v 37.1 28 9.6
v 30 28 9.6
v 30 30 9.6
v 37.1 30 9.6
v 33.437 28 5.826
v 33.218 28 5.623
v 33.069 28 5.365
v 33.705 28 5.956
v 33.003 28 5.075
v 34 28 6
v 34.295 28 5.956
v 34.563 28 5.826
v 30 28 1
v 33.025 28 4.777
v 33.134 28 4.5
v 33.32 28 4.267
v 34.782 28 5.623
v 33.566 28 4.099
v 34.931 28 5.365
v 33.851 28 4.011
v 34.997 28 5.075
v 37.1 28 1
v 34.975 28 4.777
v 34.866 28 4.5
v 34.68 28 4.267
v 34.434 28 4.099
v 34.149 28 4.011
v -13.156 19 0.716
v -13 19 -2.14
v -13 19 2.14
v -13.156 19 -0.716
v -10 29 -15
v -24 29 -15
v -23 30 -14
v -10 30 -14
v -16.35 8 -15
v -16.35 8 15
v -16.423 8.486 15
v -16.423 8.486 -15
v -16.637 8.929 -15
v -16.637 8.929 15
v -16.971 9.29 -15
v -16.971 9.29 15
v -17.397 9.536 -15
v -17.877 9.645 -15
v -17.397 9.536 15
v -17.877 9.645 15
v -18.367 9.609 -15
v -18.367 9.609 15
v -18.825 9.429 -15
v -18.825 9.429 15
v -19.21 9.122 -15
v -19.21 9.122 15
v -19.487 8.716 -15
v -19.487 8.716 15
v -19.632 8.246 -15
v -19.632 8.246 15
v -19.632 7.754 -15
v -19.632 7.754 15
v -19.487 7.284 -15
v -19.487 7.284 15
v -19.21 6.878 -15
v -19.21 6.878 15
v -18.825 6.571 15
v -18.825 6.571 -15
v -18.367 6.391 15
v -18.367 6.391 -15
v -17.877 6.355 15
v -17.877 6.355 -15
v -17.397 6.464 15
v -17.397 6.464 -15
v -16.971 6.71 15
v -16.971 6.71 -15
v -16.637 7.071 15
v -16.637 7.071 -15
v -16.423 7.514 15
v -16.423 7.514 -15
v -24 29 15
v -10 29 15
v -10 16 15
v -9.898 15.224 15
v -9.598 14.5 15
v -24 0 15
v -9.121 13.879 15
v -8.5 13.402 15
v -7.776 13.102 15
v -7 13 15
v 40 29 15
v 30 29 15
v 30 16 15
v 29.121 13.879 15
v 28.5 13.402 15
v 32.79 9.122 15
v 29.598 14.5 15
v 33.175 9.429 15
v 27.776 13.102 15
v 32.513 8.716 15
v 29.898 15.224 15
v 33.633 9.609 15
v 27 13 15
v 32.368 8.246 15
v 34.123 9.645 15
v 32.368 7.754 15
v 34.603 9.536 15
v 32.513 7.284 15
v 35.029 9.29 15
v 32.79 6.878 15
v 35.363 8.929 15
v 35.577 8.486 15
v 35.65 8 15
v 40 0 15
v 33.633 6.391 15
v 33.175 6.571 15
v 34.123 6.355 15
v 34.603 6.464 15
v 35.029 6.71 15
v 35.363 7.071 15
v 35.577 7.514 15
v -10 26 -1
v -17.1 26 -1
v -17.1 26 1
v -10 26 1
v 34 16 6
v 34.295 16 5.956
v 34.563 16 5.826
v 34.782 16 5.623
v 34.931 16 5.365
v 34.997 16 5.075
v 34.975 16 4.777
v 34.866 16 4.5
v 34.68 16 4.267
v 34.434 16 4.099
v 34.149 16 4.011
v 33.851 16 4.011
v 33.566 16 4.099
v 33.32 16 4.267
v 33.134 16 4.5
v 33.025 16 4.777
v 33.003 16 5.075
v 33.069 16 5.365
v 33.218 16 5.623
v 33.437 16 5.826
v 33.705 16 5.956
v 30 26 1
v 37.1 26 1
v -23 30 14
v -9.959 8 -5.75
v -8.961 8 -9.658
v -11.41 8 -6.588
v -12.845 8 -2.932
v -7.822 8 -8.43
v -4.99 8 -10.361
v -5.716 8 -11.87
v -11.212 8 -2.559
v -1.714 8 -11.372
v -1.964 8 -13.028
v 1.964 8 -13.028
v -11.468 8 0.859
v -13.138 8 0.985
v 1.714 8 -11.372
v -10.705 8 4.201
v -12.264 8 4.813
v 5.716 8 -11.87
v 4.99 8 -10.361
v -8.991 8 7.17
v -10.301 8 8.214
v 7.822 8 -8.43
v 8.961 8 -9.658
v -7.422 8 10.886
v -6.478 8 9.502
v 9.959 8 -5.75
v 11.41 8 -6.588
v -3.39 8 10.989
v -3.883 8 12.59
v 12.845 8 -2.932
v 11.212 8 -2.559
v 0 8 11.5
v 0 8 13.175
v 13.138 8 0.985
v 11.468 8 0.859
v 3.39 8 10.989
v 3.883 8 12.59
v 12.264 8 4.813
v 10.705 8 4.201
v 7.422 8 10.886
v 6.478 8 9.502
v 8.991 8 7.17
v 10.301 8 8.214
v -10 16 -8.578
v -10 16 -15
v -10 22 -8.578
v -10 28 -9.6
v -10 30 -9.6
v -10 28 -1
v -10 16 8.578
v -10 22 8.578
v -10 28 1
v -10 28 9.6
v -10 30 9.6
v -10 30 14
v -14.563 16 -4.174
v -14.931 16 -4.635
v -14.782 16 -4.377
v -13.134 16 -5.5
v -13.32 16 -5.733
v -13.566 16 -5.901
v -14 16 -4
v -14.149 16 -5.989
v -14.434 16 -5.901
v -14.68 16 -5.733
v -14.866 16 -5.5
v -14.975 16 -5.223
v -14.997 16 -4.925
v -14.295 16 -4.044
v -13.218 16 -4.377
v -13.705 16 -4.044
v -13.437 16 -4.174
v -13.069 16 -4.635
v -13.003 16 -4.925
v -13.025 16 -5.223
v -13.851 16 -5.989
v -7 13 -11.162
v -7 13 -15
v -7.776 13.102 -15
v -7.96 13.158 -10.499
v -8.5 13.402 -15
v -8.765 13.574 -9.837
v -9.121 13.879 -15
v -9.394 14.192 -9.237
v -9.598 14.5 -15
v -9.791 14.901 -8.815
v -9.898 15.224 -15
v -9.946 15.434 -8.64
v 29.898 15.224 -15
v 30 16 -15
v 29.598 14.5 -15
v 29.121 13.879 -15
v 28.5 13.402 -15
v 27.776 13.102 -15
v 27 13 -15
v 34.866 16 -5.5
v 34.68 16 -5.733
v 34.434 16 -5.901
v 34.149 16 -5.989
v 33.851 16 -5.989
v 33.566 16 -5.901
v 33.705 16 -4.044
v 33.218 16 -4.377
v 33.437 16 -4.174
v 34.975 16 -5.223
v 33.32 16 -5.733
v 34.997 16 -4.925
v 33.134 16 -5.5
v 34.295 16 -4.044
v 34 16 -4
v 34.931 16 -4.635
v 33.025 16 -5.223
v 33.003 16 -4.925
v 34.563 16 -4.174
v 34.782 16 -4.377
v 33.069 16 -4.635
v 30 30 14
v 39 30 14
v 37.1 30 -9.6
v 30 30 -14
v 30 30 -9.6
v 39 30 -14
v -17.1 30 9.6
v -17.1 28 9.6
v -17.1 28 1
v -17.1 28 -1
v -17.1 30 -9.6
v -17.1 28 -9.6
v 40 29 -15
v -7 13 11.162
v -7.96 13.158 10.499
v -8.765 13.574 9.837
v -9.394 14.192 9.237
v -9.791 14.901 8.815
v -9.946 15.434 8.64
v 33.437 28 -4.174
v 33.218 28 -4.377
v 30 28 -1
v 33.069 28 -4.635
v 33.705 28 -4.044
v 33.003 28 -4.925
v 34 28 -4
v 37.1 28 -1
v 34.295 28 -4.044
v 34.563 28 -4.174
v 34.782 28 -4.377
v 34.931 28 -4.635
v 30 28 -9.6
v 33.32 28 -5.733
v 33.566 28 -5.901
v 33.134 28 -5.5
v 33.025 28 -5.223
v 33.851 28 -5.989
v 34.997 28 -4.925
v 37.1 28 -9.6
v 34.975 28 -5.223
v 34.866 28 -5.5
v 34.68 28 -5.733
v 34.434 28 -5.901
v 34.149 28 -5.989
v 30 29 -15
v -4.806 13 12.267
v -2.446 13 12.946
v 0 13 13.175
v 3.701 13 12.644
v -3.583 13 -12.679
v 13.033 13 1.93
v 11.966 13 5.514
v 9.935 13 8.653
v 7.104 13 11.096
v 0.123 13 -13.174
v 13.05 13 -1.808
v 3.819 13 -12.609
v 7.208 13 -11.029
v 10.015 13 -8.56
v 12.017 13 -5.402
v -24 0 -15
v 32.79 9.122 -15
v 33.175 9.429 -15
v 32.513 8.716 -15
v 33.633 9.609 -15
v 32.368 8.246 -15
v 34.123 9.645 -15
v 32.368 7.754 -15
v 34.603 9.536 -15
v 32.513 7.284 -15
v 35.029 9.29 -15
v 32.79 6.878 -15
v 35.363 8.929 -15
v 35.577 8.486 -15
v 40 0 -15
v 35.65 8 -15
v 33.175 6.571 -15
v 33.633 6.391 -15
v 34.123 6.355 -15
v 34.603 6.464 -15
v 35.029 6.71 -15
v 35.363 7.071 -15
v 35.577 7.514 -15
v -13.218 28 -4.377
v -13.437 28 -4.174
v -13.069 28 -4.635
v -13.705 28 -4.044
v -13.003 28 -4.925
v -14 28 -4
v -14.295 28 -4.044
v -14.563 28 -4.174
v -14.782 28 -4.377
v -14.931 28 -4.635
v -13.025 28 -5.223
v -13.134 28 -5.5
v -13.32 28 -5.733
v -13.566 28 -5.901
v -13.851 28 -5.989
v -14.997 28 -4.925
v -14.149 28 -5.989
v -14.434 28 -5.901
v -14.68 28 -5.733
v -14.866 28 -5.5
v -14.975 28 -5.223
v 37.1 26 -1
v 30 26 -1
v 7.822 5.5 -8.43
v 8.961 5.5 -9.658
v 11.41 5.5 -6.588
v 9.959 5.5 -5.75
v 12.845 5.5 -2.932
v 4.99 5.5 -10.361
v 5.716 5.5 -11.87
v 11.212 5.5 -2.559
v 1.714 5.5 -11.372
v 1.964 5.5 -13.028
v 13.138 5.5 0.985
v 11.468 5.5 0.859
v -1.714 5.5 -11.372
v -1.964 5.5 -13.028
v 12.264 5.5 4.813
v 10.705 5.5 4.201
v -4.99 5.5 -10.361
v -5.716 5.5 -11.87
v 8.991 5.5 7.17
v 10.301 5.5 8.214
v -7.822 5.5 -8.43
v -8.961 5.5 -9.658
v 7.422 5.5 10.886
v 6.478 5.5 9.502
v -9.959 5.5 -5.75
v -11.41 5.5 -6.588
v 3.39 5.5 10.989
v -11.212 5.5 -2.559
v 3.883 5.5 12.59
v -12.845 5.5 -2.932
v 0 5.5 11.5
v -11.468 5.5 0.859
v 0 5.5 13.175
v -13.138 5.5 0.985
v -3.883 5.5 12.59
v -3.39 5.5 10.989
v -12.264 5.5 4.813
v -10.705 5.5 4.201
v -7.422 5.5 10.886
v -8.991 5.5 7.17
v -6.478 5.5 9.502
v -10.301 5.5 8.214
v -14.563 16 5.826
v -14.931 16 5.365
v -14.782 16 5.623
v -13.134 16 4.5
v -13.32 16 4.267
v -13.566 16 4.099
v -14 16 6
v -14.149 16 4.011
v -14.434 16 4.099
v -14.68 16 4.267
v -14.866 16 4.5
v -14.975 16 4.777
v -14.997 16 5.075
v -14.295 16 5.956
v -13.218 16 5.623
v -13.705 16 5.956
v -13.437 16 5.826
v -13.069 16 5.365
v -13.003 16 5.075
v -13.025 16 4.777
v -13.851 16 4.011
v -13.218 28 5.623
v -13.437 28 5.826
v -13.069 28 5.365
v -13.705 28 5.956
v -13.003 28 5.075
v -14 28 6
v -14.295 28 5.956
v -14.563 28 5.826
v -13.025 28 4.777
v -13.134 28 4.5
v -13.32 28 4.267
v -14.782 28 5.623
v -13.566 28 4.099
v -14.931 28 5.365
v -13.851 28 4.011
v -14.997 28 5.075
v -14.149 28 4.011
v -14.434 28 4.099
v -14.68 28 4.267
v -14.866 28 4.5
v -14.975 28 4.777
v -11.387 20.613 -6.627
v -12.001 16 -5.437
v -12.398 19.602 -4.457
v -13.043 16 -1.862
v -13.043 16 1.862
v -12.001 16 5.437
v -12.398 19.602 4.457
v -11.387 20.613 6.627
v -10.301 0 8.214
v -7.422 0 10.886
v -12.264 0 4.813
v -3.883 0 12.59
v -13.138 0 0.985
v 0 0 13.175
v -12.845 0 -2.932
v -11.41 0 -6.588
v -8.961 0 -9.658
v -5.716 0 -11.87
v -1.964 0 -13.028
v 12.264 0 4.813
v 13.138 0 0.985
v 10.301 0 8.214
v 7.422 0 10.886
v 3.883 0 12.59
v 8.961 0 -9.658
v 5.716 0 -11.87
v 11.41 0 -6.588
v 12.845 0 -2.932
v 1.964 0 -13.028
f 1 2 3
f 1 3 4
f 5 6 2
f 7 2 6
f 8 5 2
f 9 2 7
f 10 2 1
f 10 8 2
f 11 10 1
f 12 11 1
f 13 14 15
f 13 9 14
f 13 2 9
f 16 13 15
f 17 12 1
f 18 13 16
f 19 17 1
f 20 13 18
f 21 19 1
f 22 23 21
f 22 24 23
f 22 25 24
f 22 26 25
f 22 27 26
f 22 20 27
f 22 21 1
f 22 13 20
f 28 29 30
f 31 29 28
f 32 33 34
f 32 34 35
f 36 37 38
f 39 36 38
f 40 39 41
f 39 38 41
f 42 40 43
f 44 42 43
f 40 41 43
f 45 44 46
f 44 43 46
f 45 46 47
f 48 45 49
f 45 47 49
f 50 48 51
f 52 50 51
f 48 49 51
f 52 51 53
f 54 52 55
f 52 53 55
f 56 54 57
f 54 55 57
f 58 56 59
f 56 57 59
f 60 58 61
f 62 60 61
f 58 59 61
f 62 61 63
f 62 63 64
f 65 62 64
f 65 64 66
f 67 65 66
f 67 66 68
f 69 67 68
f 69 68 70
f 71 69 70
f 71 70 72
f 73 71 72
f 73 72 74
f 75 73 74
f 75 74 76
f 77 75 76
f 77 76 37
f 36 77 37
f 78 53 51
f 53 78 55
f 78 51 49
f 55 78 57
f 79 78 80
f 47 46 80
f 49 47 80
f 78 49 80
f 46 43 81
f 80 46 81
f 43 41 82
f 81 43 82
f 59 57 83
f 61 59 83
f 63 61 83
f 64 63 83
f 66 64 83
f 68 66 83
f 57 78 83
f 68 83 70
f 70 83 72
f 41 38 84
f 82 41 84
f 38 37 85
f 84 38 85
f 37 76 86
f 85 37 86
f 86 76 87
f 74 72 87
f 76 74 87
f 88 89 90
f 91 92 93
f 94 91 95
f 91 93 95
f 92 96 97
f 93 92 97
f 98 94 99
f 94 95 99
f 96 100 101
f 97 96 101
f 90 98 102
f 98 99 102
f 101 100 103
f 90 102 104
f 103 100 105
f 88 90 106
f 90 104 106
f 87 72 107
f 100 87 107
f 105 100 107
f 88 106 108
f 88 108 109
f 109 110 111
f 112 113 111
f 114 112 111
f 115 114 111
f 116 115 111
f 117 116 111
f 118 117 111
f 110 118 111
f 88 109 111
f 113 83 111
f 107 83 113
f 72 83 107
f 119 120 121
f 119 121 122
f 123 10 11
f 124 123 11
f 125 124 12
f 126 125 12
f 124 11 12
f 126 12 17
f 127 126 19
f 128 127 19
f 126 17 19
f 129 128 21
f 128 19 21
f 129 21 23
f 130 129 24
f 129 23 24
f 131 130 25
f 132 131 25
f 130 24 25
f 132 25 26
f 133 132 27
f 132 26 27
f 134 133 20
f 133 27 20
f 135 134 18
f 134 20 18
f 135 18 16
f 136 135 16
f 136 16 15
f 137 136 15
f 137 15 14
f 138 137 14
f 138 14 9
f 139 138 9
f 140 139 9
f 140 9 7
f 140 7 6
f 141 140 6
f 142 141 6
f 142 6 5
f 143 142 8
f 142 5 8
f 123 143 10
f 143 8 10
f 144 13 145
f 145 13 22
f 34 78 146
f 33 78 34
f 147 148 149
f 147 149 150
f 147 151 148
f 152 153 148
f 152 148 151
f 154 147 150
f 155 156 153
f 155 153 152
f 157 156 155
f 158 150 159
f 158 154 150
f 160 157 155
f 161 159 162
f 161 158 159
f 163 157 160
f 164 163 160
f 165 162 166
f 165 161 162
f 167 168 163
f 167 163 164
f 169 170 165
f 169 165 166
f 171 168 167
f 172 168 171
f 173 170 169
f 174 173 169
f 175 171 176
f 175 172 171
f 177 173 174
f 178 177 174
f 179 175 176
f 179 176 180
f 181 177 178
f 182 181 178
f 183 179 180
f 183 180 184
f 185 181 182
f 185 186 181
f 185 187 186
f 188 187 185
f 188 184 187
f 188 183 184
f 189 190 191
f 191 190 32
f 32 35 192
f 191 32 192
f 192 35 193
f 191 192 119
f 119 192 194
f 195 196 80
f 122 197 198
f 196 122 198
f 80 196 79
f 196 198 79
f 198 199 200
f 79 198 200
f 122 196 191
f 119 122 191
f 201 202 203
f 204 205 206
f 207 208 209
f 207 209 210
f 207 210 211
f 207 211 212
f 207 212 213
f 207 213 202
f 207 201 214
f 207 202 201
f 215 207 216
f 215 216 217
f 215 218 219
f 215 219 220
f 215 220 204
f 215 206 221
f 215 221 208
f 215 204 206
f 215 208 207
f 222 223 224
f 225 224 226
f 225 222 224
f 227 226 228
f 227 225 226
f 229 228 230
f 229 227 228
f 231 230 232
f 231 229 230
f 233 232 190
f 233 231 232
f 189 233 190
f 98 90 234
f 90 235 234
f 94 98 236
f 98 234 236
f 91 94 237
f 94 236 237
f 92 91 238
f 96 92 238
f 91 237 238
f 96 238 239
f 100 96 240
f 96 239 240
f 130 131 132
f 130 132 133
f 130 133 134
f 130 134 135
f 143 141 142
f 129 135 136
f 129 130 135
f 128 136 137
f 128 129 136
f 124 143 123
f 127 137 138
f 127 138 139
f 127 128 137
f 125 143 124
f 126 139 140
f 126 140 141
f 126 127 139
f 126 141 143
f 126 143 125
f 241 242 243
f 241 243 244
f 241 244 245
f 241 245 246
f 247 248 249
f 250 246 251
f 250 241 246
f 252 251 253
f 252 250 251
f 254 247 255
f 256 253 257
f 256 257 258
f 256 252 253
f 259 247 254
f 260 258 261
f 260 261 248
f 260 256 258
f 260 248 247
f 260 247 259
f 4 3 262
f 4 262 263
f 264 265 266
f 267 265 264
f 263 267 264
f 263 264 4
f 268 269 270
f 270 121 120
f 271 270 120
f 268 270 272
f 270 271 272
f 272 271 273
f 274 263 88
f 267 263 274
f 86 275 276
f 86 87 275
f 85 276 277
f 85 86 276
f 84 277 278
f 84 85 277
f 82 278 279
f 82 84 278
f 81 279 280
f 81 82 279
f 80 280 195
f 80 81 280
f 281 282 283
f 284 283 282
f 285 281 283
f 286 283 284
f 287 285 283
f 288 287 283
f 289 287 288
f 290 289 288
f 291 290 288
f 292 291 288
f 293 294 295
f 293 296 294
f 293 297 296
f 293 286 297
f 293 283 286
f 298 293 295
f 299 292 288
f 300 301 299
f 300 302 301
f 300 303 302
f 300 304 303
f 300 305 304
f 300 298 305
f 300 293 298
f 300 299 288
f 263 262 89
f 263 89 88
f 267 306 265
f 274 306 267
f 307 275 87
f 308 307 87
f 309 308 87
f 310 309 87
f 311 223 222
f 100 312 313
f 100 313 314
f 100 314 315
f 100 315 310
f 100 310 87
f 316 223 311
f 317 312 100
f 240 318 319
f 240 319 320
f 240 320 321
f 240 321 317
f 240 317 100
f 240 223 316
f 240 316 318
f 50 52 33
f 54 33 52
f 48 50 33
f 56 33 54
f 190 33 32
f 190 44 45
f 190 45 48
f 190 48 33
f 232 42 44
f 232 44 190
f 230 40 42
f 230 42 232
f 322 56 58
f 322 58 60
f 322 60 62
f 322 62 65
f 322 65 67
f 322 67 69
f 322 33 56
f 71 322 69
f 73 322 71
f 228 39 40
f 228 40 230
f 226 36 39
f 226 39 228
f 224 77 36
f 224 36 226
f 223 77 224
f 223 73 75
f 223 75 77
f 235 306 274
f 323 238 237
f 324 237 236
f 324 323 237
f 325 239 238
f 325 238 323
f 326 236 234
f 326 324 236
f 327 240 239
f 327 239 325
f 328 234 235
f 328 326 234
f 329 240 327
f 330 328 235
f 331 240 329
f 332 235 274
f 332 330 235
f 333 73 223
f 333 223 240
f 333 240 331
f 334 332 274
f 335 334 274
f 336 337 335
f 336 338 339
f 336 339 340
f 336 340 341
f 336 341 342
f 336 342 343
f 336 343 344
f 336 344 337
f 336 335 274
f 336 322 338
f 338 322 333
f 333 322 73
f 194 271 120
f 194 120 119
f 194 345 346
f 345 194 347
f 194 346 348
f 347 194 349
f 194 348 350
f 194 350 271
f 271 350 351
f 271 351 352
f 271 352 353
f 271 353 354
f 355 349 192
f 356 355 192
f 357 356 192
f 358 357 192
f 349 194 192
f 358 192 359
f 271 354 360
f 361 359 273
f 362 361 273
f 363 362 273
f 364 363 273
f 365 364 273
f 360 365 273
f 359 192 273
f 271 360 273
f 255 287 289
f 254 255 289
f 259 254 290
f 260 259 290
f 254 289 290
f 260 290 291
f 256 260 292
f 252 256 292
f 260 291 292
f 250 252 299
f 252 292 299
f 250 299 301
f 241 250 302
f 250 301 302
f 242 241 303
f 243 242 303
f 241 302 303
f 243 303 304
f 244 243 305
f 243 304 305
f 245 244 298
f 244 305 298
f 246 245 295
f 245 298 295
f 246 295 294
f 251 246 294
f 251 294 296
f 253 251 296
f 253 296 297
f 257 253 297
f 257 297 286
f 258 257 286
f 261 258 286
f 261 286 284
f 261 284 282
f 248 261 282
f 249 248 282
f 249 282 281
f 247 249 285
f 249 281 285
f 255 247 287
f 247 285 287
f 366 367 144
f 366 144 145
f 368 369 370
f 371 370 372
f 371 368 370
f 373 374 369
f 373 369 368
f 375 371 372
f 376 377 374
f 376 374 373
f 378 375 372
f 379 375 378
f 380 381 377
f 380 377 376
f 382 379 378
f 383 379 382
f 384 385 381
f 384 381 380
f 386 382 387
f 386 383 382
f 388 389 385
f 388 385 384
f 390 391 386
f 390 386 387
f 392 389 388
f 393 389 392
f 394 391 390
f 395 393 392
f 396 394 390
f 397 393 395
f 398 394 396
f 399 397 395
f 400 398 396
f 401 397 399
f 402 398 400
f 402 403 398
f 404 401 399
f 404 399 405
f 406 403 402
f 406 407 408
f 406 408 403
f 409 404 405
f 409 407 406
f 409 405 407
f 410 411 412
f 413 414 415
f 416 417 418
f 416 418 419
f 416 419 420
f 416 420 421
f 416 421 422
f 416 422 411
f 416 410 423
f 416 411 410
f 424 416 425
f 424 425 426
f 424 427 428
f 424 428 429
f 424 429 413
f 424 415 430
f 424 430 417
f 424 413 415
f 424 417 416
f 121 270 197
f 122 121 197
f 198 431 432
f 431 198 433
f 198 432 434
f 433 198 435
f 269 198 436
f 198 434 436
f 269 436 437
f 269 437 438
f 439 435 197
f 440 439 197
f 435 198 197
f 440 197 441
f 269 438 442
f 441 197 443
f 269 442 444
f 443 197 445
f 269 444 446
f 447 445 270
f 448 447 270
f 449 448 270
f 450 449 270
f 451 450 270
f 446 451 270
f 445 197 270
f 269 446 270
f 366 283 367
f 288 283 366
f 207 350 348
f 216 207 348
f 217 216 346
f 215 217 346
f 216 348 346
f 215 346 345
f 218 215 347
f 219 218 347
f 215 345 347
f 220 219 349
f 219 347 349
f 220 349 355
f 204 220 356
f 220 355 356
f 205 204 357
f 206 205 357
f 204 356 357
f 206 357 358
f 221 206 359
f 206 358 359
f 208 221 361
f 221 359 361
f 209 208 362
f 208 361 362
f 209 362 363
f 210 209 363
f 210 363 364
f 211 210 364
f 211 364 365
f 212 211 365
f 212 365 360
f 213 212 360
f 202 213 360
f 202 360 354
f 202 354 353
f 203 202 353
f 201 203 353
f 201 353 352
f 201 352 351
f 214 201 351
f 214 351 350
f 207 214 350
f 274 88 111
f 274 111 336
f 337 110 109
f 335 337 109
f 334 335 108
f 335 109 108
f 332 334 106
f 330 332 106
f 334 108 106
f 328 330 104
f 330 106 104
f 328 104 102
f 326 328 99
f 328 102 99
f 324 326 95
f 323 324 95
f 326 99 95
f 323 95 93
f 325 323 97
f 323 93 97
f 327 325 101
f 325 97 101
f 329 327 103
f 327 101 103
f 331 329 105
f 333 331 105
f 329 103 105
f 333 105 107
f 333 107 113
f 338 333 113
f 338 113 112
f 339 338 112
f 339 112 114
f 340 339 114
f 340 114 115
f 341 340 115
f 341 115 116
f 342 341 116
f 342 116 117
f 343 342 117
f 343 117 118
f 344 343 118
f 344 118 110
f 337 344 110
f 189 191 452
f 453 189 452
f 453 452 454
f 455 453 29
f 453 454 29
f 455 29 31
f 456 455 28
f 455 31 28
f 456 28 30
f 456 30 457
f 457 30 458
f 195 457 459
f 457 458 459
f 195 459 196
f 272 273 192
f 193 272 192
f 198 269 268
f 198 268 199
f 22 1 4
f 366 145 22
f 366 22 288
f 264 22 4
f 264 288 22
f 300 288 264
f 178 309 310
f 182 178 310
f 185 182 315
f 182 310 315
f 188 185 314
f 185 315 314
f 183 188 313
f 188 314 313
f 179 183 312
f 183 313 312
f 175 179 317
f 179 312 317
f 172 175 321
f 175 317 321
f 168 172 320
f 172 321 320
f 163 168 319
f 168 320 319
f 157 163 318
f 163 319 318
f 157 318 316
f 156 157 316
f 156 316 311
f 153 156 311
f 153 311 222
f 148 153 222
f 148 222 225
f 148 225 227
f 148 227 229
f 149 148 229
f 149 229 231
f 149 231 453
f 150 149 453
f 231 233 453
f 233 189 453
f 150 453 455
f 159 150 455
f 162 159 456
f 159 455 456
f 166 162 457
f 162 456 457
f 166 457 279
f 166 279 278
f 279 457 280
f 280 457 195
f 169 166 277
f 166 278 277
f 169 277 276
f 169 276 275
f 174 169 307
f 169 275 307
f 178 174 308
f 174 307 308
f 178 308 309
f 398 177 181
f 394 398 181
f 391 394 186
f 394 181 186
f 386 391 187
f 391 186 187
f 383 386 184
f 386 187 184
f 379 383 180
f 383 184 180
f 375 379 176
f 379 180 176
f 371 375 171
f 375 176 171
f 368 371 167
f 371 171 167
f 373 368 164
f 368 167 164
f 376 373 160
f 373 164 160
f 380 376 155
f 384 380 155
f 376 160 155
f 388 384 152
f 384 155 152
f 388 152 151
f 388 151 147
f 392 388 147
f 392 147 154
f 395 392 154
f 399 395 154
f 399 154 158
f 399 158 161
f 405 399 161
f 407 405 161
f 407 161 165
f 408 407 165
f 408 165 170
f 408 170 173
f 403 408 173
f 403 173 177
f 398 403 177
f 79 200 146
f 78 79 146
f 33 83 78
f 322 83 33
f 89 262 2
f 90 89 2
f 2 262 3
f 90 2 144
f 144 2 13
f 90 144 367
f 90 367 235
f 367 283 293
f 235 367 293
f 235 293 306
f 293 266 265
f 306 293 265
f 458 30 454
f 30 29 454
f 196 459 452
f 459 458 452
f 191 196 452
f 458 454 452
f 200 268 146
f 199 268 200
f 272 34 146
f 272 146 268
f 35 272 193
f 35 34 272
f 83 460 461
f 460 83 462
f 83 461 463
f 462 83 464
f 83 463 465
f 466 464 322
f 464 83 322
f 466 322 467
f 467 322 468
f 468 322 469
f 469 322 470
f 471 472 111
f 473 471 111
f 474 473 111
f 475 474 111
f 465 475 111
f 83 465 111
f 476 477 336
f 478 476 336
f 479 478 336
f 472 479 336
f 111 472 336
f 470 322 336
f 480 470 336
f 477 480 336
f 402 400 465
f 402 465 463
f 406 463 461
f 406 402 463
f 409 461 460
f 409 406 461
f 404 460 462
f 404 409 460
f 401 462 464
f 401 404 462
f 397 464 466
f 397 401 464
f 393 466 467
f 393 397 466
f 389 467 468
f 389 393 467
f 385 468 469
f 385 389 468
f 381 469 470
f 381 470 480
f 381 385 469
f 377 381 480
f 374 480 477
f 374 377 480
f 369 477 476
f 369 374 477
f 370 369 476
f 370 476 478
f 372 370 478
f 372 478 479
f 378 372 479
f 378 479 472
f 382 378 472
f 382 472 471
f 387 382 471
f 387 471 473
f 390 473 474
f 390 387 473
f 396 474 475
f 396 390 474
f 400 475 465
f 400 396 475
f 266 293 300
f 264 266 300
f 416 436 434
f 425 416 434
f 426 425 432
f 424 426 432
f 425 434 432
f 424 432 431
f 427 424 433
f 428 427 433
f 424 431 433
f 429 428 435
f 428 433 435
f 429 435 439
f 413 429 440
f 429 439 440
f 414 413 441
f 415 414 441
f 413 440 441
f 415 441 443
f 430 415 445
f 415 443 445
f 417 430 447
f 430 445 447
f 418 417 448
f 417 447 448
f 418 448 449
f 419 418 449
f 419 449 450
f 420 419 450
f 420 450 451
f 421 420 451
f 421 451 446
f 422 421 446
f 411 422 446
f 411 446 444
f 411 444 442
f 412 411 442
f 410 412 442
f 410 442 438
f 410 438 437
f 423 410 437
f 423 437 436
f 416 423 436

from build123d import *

# Parameters (mm, degrees)
SKETCH_1_W             = 64
SKETCH_1_H             = 30
EXTRUDE_545_DEPTH      = 13
SKETCH_2_R             = 13.175
CUT_EXTRUDE_683_DEPTH  = 5
CUT_EXTRUDE_START      = -5.5
SKETCH_3_R             = 13.175
CUT_EXTRUDE_807_DEPTH  = 5.5
SKETCH_4_R             = 11.5
CUT_EXTRUDE_897_DEPTH  = 44.462627624
EXTRUDE_START          = 3
SKETCH_8_W             = 64
SKETCH_8_H             = 30
SKETCH_8_R             = 13.175
EXTRUDE_1112_DEPTH     = 3
EXTRUDE_START_2        = 12
SKETCH_9_W             = 10
SKETCH_9_H             = 30
EXTRUDE_1450_DEPTH     = 12
SKETCH_10_R            = 1
CUT_EXTRUDE_1737_DEPTH = 12
SKETCH_11_R            = 1.65
CUT_EXTRUDE_2233_DEPTH = 58.306195128
SKETCH_12_W            = 10
SKETCH_12_H            = 5.4
EXTRUDE_2614_DEPTH     = 2
CUT_EXTRUDE_2853_DEPTH = 3
SKETCH_15_W            = 10
SKETCH_15_H            = 19.2
SKETCH_15_R            = 1
EXTRUDE_3124_DEPTH     = 9
CHAMFER_5_SIZE         = 3
SKETCH_17_W            = 2.9
SKETCH_17_H            = 19.2
EXTRUDE_3548_DEPTH     = 2
SKETCH_16_W            = 7.1
SKETCH_16_H            = 2
CUT_EXTRUDE_3829_DEPTH = 2
SKETCH_18_W            = 4
SKETCH_18_H            = 30
EXTRUDE_3994_DEPTH     = 14
FILLET_4_R             = 3
CHAMFER_7_SIZE         = 1


with BuildPart() as part:
    # Эскиз1 → Extrude 545 (new body)
    with BuildSketch(Plane(origin=(0, 0, 0), x_dir=(1, 0, 0), z_dir=(0, 1, 0))):
        with Locations((8, 0)):
            Rectangle(SKETCH_1_W, SKETCH_1_H)
    extrude(amount=EXTRUDE_545_DEPTH)

    # Эскиз2 → Cut-Extrude 683 (cut)
    with BuildSketch(Plane(origin=(0, 13, 0), x_dir=(1, 0, 0), z_dir=(0, 1, 0))):
        with Locations(Location((0, 0, 0), (0, 0, 270))):
            Circle(SKETCH_2_R)
    extrude(amount=-CUT_EXTRUDE_683_DEPTH, mode=Mode.SUBTRACT)

    # Эскиз3 → Cut-Extrude 807 (cut)
    with BuildSketch(Plane.XZ.offset(CUT_EXTRUDE_START)):
        with Locations(Location((0, 0, 0), (0, 0, 90))):
            Circle(SKETCH_3_R)
    extrude(amount=CUT_EXTRUDE_807_DEPTH, mode=Mode.SUBTRACT)

    # Эскиз4 → Cut-Extrude 897 (cut, through all)
    with BuildSketch(Plane(origin=(0, 8, 0), x_dir=(1, 0, 0), z_dir=(0, 1, 0))):
        with Locations(Location((0, 0, 0), (0, 0, 270))):
            Circle(SKETCH_4_R)
    extrude(amount=-CUT_EXTRUDE_897_DEPTH, mode=Mode.SUBTRACT)

    # Эскиз8 → Extrude 1112 (add)
    with BuildSketch(Plane(origin=(0, 13, 0), x_dir=(1, 0, 0), z_dir=(0, 1, 0)).offset(EXTRUDE_START)):
        with Locations((8, 0)):
            Rectangle(SKETCH_8_W, SKETCH_8_H)
        with Locations(Location((0, 0, 0), (0, 0, 270))):
            Circle(SKETCH_8_R, mode=Mode.SUBTRACT)
    extrude(amount=-EXTRUDE_1112_DEPTH)

    # Эскиз9 → Extrude 1450 (add)
    with BuildSketch(Plane(origin=(0, 16, 0), x_dir=(1, 0, 0), z_dir=(0, 1, 0)).offset(EXTRUDE_START_2)):
        with BuildLine():
            Line((-20, 15), (-10, 15))
            Line((-10, 15), (-10, 8.577914956))
            ThreePointArc((-10, 8.577914956), (-13.175, 0), (-10, -8.577914956))
            Line((-10, -8.577914956), (-10, -15))
            Line((-10, -15), (-20, -15))
            Line((-20, -15), (-20, 15))
        make_face()
        with Locations((35, 0)):
            Rectangle(SKETCH_9_W, SKETCH_9_H)
    extrude(amount=-EXTRUDE_1450_DEPTH)

    # Эскиз10 → Cut-Extrude 1737 (cut)
    with BuildSketch(Plane(origin=(0, 28, 0), x_dir=(1, 0, 0), z_dir=(0, 1, 0))):
        with Locations(Location((-14, 5, 0), (0, 0, 270))):
            Circle(SKETCH_10_R)
        with Locations(Location((-14, -5, 0), (0, 0, 270))):
            Circle(SKETCH_10_R)
        with Locations(Location((34, -5, 0), (0, 0, 270))):
            Circle(SKETCH_10_R)
        with Locations(Location((34, 5, 0), (0, 0, 270))):
            Circle(SKETCH_10_R)
    extrude(amount=-CUT_EXTRUDE_1737_DEPTH, mode=Mode.SUBTRACT)

    # Эскиз11 → Cut-Extrude 2233 (cut, through all)
    with BuildSketch(Plane.XY.offset(15)):
        with Locations((-18, 8)):
            Circle(SKETCH_11_R)
        with Locations((34, 8)):
            Circle(SKETCH_11_R)
    extrude(amount=-CUT_EXTRUDE_2233_DEPTH, mode=Mode.SUBTRACT)

    # Эскиз12 → Extrude 2614 (add)
    with BuildSketch(Plane(origin=(0, 28, 0), x_dir=(1, 0, 0), z_dir=(0, 1, 0))):
        with Locations((-15, 12.3)):
            Rectangle(SKETCH_12_W, SKETCH_12_H)
        with Locations((-15, -12.3)):
            Rectangle(SKETCH_12_W, SKETCH_12_H)
        with Locations((35, -12.3)):
            Rectangle(SKETCH_12_W, SKETCH_12_H)
        with Locations((35, 12.3)):
            Rectangle(SKETCH_12_W, SKETCH_12_H)
    extrude(amount=EXTRUDE_2614_DEPTH)

    # Эскиз14 → Cut-Extrude 2853 (cut)
    with BuildSketch(Plane(origin=(0, 16, 0), x_dir=(1, 0, 0), z_dir=(0, 1, 0))):
        with BuildLine():
            Line((-10, 15), (-10, 8.577914956))
            ThreePointArc((-10, 8.577914956), (13.175, 0), (-10, -8.577914956))
            Line((-10, -8.577914956), (-10, -15))
            Line((-10, -15), (30, -15))
            Line((30, -15), (30, 15))
            Line((30, 15), (-10, 15))
        make_face()
    extrude(amount=-CUT_EXTRUDE_2853_DEPTH, mode=Mode.SUBTRACT)

    # Эскиз15 → Extrude 3124 (add)
    with BuildSketch(Plane(origin=(0, 28, 0), x_dir=(1, 0, 0), z_dir=(0, 1, 0))):
        with Locations((-15, 0)):
            Rectangle(SKETCH_15_W, SKETCH_15_H)
        with Locations(Location((-14, 5, 0), (0, 0, 270))):
            Circle(SKETCH_15_R, mode=Mode.SUBTRACT)
        with Locations(Location((-14, -5, 0), (0, 0, 270))):
            Circle(SKETCH_15_R, mode=Mode.SUBTRACT)
    extrude(amount=-EXTRUDE_3124_DEPTH)

    # Фаска5
    chamfer_5_edges = [part.edges().sort_by_distance(p)[0] for p in [
        (-10, 19, 0),
    ]]
    chamfer(chamfer_5_edges, length=CHAMFER_5_SIZE)

    # Эскиз17 → Extrude 3548 (add)
    with BuildSketch(Plane(origin=(0, 28, 0), x_dir=(1, 0, 0), z_dir=(0, 1, 0))):
        with Locations((-18.55, 0)):
            Rectangle(SKETCH_17_W, SKETCH_17_H)
        with Locations((38.55, 0)):
            Rectangle(SKETCH_17_W, SKETCH_17_H)
    extrude(amount=EXTRUDE_3548_DEPTH)

    # Эскиз16 → Cut-Extrude 3829 (cut)
    with BuildSketch(Plane(origin=(0, 28, 0), x_dir=(1, 0, 0), z_dir=(0, 1, 0))):
        with Locations((-13.55, 0)):
            Rectangle(SKETCH_16_W, SKETCH_16_H)
        with Locations((33.55, 0)):
            Rectangle(SKETCH_16_W, SKETCH_16_H)
    extrude(amount=-CUT_EXTRUDE_3829_DEPTH, mode=Mode.SUBTRACT)

    # Эскиз18 → Extrude 3994 (add)
    with BuildSketch(Plane(origin=(0, 16, 0), x_dir=(1, 0, 0), z_dir=(0, 1, 0))):
        with Locations((-22, 0)):
            Rectangle(SKETCH_18_W, SKETCH_18_H)
    extrude(amount=EXTRUDE_3994_DEPTH)

    # Скругление4
    fillet_4_edges = [part.edges().sort_by_distance(p)[0] for p in [
        (30, 13, 0),
        (-10, 13, 11.788957478),
        (-10, 13, -11.788957478),
    ]]
    fillet(fillet_4_edges, radius=FILLET_4_R)

    # Фаска7
    chamfer_7_edges = [part.edges().sort_by_distance(p)[0] for p in [
        (-17, 30, -15),
        (-17, 30, 15),
        (40, 30, 0),
        (35, 30, 15),
        (35, 30, -15),
        (-24, 30, 0),
    ]]
    chamfer(chamfer_7_edges, length=CHAMFER_7_SIZE)


solid = part.part
